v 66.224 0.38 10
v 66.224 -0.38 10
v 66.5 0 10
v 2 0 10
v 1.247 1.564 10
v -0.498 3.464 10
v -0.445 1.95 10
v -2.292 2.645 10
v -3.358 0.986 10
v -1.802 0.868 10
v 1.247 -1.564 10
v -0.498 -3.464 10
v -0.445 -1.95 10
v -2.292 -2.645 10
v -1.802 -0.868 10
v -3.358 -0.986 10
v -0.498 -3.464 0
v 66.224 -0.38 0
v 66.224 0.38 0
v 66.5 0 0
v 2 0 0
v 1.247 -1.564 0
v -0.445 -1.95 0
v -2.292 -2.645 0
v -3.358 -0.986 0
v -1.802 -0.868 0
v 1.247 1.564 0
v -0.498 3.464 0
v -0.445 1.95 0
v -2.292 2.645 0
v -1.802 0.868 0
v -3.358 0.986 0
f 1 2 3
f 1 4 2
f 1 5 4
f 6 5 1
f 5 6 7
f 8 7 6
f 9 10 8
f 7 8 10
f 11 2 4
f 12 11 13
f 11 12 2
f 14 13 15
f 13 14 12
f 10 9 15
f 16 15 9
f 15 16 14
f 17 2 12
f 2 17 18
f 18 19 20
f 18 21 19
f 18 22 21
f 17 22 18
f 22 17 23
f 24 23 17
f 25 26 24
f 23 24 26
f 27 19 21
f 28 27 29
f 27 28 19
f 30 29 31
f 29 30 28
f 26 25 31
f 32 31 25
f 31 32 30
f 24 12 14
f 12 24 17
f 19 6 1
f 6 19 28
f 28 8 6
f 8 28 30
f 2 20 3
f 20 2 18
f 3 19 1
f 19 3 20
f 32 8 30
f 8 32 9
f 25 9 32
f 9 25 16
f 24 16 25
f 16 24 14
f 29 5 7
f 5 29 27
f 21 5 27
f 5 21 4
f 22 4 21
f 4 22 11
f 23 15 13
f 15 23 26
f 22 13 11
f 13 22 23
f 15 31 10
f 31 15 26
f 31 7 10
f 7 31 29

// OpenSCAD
/// alle maten in milimeters 
/// Wouter 16-3-2016

hoogste = 7; //hoogste kant van de wig
lengte = 70; //lengte van de wig 
breedte = 10; //breedte van de wig
laagste = 0.8; //laagste kant van de wig
gaatje = 4;

difference (){
hull(){
cylinder(d=hoogste, h=breedte);
translate([lengte-(hoogste/2)-(laagste/2),0,0]) cylinder(d=laagste, h=breedte); 
}

translate ([0,0,-1]) cylinder (d=gaatje, h=breedte+2);
}
